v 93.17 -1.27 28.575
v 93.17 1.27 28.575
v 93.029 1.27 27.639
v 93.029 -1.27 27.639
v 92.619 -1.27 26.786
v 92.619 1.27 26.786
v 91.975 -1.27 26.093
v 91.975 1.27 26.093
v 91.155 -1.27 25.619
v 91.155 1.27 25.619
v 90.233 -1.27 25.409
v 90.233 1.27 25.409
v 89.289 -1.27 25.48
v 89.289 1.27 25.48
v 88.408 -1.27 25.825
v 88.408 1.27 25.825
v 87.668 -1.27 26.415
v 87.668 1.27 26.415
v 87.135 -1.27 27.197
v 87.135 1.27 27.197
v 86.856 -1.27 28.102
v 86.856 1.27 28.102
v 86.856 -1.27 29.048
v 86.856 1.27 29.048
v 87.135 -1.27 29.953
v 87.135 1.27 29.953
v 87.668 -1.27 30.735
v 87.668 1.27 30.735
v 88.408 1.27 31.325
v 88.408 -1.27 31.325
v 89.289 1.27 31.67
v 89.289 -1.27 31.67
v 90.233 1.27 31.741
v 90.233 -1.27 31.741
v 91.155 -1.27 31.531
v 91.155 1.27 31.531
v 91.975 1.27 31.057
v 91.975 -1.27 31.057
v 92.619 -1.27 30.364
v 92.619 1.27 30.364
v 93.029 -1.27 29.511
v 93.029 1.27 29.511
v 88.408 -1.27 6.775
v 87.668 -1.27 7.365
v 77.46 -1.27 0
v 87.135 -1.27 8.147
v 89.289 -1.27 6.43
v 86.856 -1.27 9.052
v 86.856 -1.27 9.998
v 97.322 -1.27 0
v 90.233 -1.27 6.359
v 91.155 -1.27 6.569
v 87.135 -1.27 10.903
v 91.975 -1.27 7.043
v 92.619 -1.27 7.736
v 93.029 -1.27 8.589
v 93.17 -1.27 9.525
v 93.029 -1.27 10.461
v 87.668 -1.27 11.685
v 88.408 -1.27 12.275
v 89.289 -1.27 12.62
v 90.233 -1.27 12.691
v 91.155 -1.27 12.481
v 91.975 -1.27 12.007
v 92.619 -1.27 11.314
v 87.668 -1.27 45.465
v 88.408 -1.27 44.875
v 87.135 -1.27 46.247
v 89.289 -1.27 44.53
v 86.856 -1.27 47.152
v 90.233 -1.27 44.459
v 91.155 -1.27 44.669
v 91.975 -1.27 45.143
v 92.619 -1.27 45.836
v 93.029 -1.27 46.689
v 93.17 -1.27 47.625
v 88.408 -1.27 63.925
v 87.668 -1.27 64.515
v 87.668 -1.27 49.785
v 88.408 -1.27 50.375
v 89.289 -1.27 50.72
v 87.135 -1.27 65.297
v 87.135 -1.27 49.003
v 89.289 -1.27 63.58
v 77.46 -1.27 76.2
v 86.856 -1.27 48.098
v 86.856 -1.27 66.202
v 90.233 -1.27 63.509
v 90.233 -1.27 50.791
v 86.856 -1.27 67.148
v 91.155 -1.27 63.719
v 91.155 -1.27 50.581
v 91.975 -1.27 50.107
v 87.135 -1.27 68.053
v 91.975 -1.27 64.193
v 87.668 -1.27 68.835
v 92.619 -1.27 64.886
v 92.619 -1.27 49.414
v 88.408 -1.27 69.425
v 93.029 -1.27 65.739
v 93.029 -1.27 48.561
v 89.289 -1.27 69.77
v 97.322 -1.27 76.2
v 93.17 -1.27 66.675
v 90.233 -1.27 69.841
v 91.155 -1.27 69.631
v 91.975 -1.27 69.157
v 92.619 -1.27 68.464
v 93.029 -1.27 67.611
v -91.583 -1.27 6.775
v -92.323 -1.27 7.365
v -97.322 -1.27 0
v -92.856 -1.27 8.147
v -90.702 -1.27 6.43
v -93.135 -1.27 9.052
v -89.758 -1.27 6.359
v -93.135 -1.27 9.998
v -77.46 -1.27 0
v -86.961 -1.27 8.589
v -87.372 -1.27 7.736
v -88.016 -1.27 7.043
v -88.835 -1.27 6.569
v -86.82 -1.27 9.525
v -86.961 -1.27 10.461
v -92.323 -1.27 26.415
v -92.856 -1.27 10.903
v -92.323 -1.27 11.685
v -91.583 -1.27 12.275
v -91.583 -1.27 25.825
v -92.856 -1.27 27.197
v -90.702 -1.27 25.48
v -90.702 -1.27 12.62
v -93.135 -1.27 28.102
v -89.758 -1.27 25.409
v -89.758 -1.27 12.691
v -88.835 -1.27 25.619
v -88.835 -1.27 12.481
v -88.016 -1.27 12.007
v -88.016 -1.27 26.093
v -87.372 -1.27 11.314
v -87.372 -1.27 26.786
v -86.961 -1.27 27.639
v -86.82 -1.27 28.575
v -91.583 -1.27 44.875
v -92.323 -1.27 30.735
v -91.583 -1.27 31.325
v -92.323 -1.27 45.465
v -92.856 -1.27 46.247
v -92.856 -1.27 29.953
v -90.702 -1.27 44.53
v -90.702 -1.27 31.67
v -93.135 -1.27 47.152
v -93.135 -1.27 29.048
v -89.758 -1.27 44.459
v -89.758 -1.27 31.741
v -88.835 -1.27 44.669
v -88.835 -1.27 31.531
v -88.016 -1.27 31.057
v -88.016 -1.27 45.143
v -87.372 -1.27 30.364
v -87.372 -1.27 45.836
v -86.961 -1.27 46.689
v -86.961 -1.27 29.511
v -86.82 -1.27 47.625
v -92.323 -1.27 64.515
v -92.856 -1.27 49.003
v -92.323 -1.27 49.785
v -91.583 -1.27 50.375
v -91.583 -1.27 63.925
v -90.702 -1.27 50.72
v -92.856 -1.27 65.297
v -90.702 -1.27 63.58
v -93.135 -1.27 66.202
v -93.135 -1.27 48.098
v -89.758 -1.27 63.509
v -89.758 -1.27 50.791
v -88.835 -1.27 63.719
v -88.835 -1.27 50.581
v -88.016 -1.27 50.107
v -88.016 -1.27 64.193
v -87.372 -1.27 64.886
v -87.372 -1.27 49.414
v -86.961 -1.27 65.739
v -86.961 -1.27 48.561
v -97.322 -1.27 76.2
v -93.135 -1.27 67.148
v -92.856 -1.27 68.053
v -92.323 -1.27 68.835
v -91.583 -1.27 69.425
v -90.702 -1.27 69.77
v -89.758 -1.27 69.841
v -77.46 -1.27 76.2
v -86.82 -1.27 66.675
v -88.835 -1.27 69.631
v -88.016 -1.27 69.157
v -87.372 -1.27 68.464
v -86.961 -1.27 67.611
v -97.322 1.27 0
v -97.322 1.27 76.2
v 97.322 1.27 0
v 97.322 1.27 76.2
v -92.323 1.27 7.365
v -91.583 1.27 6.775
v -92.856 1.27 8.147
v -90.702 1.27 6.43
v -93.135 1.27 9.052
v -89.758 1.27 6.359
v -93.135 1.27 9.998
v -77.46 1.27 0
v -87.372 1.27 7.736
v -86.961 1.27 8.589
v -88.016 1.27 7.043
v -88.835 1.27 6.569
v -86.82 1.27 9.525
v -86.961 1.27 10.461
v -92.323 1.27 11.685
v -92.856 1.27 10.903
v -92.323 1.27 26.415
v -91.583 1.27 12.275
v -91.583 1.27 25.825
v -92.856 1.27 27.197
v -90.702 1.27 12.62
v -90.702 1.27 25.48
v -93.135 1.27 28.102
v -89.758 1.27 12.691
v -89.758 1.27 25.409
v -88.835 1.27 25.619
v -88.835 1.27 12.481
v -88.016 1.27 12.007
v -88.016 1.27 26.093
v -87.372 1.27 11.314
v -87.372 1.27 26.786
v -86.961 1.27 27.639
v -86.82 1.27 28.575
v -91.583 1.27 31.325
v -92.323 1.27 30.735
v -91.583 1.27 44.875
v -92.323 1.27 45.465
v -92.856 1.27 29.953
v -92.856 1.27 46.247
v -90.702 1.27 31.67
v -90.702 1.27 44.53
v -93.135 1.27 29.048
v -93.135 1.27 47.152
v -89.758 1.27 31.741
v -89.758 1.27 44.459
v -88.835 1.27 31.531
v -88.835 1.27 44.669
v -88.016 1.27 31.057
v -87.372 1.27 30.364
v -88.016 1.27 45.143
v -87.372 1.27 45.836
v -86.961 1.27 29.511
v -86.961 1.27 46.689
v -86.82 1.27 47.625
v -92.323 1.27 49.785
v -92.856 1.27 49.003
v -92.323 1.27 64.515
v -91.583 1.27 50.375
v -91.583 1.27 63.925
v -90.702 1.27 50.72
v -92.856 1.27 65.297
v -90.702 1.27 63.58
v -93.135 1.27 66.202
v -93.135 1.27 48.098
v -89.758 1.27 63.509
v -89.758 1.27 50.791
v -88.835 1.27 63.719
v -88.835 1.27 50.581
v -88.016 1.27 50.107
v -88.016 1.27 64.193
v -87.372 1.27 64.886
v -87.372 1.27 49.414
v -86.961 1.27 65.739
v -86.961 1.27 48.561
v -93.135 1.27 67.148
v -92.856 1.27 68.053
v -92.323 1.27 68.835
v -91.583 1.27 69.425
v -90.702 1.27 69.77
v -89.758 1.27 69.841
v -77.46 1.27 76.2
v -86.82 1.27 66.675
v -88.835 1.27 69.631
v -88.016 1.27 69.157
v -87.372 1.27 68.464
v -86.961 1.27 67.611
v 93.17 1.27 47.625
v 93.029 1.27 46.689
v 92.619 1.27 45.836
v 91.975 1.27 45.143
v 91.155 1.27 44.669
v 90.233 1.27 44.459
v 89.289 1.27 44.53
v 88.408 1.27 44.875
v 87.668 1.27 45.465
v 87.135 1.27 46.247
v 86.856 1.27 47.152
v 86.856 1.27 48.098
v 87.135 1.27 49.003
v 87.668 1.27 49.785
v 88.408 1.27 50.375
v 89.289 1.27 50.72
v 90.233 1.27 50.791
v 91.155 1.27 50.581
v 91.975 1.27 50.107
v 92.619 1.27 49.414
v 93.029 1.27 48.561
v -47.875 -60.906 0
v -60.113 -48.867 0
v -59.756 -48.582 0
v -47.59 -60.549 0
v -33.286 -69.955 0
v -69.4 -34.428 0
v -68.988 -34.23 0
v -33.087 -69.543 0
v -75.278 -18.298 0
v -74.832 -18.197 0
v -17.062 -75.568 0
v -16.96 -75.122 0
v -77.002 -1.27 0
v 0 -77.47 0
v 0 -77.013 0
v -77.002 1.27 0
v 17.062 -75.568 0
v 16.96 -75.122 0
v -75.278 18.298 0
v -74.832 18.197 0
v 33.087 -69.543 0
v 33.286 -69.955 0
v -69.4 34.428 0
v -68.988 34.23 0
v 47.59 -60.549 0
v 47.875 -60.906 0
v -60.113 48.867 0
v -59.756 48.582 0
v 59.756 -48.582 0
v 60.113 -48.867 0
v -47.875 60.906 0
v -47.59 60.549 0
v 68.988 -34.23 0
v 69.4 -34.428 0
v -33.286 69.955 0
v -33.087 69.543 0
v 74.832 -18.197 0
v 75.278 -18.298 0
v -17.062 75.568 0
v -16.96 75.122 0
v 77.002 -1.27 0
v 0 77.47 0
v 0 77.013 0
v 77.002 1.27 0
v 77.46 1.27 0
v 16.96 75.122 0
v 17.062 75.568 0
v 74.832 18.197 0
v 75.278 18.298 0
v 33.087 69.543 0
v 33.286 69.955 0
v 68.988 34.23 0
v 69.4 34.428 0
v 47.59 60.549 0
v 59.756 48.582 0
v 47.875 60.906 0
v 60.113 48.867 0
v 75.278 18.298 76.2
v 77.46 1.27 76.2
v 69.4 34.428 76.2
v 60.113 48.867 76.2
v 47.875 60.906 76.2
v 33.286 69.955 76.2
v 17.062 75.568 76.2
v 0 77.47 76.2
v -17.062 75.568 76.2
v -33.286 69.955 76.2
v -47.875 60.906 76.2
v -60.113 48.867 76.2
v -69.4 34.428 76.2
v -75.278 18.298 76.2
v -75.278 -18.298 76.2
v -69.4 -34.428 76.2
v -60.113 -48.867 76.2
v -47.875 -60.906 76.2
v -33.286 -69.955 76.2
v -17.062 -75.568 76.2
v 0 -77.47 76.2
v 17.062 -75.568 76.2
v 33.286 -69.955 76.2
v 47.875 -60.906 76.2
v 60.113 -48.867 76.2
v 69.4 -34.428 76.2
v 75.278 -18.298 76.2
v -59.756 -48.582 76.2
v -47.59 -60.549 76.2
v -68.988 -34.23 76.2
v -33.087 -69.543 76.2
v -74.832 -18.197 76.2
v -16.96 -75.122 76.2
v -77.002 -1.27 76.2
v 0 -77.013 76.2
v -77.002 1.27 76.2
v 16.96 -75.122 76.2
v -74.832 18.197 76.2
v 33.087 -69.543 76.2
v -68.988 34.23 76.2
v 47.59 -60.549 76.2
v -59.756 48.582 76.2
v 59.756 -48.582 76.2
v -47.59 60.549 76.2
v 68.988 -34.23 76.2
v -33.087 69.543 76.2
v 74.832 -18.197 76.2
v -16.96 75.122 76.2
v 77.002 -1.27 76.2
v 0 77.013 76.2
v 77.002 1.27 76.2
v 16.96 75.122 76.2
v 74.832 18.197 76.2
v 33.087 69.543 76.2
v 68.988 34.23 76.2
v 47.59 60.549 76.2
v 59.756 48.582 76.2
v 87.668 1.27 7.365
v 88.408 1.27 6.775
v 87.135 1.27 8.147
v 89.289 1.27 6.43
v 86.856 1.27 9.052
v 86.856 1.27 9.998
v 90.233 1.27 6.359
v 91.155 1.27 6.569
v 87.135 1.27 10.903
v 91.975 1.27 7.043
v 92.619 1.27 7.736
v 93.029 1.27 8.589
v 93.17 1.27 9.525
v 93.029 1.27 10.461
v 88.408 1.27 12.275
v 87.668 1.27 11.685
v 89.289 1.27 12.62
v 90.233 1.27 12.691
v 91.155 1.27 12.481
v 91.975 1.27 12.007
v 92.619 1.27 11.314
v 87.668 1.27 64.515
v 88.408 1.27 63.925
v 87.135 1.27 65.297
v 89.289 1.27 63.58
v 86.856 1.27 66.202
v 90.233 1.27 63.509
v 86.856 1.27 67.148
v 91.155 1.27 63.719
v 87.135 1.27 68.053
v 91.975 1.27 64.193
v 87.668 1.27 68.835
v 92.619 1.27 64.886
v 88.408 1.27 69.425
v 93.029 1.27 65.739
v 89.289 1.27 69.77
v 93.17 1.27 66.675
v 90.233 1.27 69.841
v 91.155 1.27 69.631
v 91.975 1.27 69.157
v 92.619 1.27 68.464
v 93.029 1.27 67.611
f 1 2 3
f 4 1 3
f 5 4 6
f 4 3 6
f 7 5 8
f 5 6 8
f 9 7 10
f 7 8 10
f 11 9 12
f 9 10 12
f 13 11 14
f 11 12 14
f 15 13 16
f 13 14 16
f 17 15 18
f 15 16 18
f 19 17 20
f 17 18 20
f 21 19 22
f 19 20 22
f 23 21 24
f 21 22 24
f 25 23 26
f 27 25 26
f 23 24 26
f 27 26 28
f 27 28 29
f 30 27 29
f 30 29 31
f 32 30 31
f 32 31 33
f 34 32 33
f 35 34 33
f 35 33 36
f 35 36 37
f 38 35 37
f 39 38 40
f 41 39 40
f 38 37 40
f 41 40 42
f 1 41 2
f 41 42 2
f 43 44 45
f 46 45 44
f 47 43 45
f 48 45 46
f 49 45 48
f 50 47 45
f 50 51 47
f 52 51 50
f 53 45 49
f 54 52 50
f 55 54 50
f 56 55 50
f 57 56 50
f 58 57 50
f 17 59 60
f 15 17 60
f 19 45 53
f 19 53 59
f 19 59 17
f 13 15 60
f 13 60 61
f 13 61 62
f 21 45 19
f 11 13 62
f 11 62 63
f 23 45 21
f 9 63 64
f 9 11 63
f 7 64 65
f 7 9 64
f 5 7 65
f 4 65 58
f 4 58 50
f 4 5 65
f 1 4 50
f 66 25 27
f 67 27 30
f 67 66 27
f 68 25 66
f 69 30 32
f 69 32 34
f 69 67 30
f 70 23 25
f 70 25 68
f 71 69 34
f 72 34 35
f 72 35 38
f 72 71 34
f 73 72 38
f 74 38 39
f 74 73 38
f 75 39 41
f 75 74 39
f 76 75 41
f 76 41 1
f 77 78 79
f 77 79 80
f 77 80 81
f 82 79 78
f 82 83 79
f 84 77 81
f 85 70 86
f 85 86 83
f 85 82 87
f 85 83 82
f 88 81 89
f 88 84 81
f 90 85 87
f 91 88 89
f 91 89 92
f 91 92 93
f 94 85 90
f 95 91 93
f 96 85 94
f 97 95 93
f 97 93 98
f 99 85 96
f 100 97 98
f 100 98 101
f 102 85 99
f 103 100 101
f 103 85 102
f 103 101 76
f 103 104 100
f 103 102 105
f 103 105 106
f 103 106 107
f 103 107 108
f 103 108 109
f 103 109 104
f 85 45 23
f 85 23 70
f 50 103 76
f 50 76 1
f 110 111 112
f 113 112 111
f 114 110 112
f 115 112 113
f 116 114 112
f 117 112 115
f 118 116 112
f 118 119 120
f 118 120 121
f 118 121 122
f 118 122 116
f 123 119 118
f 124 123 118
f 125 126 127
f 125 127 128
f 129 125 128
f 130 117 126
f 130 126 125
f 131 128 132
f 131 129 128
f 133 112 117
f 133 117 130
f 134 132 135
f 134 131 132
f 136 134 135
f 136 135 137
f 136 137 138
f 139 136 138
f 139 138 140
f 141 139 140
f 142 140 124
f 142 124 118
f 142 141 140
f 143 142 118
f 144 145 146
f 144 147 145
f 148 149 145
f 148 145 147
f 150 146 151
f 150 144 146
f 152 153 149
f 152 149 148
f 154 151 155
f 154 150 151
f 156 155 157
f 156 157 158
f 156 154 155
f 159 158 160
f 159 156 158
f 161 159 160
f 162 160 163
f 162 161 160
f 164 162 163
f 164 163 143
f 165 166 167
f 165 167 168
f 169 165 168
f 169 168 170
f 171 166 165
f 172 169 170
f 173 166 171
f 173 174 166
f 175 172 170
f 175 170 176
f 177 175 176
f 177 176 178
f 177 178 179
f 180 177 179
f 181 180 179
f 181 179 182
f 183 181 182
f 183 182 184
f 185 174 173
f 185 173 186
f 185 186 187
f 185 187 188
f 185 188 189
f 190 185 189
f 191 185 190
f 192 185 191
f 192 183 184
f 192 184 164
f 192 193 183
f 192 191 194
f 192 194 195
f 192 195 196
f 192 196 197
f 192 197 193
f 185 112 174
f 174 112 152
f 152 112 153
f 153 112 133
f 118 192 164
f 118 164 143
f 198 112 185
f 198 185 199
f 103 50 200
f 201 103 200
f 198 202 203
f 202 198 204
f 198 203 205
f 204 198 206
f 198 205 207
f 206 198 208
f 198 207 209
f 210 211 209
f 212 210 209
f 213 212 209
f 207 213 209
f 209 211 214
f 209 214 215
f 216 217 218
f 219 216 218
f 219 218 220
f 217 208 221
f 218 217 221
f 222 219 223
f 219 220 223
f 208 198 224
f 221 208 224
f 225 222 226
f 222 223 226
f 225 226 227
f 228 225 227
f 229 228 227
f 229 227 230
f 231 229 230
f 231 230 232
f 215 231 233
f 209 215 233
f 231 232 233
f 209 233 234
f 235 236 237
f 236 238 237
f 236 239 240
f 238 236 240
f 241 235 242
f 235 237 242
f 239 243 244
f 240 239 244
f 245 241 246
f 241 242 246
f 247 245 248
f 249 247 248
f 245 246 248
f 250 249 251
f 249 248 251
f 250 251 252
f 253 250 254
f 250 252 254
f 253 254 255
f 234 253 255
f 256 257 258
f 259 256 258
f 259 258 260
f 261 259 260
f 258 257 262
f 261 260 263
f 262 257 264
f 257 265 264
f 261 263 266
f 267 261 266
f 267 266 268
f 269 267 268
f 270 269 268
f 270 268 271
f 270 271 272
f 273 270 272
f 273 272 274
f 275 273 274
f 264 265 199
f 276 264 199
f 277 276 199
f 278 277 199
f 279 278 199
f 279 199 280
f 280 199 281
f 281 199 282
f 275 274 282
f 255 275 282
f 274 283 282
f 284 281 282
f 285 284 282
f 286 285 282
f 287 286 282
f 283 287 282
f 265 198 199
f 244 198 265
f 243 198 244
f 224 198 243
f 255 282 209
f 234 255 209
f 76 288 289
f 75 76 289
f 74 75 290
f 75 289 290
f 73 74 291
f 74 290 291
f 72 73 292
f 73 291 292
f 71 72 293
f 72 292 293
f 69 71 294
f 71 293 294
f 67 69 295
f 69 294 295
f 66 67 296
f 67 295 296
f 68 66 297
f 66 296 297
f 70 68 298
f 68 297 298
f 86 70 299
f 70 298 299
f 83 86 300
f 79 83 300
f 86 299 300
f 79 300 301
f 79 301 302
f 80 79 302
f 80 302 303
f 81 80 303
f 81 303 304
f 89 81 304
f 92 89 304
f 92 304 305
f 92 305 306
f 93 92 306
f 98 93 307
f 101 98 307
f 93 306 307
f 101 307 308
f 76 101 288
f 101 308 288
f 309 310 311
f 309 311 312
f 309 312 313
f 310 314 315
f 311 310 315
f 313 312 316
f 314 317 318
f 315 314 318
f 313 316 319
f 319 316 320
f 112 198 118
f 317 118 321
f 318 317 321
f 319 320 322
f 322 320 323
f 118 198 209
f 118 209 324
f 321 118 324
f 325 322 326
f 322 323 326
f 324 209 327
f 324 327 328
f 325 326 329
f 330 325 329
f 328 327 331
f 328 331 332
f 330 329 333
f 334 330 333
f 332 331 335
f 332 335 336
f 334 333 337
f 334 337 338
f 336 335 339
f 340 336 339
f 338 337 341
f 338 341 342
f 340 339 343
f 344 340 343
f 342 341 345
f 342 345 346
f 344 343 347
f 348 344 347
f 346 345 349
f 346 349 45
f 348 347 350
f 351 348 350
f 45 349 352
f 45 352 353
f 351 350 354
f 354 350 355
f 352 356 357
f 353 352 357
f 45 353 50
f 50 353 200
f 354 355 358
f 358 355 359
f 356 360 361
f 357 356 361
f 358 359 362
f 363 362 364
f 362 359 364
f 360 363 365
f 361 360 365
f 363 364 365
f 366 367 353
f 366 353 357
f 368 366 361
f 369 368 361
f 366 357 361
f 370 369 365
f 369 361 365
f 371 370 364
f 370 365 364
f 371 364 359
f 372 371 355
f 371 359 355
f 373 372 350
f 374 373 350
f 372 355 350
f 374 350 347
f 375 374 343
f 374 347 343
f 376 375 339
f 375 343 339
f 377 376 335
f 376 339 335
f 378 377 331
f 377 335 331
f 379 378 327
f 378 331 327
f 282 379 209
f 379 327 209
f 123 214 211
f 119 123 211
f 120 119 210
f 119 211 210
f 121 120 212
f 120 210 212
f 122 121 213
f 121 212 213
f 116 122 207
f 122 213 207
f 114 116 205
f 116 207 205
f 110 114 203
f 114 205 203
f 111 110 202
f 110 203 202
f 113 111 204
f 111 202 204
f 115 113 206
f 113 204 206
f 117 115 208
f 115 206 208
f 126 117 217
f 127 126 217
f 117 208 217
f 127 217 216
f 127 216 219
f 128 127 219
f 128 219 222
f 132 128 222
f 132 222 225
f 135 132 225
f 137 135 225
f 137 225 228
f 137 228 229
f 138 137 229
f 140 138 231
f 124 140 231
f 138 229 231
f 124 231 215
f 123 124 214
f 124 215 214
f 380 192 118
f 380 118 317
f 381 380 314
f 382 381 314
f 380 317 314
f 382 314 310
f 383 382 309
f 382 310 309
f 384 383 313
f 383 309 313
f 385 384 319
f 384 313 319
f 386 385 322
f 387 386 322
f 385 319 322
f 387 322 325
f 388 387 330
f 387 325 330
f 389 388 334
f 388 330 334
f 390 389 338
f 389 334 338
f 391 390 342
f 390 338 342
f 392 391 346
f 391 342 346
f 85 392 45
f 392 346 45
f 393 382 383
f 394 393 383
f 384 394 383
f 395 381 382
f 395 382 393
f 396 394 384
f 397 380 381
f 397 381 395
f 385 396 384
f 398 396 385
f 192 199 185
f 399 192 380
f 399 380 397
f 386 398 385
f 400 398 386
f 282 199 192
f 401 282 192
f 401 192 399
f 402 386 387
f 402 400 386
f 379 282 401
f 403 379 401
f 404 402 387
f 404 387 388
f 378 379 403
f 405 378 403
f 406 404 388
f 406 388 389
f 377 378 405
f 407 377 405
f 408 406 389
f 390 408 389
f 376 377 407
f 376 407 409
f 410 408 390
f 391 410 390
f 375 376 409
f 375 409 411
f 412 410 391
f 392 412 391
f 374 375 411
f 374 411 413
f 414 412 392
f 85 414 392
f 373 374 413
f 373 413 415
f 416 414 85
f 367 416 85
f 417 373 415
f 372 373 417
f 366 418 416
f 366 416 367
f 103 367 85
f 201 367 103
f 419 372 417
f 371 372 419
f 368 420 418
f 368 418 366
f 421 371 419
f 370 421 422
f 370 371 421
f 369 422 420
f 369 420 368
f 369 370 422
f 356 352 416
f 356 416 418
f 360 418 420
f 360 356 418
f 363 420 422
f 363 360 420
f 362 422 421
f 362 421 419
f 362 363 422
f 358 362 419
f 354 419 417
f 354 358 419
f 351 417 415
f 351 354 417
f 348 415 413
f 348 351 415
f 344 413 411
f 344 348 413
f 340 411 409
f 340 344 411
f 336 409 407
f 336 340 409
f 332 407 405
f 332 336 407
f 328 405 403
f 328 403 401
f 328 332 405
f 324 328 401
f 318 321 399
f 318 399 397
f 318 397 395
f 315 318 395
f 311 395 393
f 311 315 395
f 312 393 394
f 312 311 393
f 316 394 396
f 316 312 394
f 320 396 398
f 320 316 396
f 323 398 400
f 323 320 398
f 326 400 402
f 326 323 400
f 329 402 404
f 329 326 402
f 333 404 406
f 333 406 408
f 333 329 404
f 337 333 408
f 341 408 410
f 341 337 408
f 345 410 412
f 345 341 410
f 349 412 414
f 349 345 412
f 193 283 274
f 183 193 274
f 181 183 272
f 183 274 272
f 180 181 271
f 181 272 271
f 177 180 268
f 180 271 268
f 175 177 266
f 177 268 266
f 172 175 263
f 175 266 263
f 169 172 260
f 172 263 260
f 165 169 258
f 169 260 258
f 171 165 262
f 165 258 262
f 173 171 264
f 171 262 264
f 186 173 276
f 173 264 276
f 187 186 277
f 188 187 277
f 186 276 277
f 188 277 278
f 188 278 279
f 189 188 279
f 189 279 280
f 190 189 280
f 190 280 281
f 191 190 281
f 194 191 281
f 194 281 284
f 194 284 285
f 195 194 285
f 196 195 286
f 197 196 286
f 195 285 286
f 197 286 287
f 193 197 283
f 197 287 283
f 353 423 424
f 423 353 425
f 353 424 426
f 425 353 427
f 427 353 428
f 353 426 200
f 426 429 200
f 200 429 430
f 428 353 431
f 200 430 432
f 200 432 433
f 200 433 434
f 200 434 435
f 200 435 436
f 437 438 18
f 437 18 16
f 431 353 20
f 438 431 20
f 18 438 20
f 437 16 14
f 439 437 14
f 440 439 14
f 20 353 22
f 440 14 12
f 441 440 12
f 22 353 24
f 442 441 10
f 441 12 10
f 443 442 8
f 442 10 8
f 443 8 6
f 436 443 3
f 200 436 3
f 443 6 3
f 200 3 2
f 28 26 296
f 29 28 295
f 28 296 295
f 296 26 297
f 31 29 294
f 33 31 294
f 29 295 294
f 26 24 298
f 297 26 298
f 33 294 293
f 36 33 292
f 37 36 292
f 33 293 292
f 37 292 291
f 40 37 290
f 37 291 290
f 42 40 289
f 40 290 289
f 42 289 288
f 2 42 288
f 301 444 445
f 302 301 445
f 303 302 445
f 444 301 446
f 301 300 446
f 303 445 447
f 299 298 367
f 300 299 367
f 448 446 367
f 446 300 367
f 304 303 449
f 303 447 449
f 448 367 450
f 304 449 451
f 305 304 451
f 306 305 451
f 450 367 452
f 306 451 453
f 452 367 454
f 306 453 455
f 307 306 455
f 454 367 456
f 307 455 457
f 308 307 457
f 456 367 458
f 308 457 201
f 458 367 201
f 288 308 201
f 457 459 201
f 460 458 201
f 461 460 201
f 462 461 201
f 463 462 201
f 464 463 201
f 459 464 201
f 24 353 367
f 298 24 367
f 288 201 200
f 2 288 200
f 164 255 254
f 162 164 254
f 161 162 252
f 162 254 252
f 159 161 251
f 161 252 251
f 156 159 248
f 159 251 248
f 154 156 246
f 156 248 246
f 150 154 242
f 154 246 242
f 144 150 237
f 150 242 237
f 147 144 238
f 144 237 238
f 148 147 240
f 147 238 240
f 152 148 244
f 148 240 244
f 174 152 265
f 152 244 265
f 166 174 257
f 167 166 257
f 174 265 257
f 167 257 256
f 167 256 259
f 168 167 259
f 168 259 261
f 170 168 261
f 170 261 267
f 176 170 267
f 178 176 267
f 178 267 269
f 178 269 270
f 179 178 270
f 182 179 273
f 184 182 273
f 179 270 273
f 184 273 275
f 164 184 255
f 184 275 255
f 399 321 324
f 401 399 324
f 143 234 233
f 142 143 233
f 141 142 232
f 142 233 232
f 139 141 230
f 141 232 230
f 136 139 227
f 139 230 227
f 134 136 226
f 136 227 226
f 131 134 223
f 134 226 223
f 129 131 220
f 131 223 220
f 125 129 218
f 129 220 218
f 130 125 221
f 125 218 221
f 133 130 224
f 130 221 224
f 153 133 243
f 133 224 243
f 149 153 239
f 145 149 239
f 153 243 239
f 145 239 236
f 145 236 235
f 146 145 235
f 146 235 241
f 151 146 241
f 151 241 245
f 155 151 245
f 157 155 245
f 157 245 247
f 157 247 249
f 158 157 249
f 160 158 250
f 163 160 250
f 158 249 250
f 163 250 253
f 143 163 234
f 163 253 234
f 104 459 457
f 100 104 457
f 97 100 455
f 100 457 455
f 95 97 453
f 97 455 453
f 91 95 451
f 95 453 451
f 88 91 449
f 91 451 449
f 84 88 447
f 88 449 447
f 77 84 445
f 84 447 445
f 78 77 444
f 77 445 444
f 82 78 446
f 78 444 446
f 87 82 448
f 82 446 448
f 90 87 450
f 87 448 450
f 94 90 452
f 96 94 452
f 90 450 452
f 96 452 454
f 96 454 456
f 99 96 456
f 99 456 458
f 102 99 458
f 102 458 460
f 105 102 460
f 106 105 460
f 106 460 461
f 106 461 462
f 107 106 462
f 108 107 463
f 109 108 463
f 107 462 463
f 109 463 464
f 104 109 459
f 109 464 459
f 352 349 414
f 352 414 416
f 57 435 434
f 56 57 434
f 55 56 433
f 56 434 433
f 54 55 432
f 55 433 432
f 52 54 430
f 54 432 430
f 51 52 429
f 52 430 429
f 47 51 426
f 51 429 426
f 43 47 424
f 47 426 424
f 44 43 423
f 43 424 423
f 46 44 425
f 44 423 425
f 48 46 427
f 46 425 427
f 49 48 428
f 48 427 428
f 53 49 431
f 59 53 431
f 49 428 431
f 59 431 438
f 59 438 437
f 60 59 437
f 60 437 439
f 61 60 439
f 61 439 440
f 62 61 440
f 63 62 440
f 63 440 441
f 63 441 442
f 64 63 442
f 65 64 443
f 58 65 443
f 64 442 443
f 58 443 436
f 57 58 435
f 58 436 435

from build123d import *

# Parameters (mm, degrees)
SKETCH1_R           = 77.47
SKETCH1_R_2         = 77.0128
BOSS_EXTRUDE1_DEPTH = 76.2
SKETCH2_W           = 20.32
SKETCH2_H           = 2.54
BOSS_EXTRUDE2_DEPTH = 76.2
SKETCH3_R           = 3.175
CUT_EXTRUDE3_DEPTH  = 2.54


with BuildPart() as part:
    # Sketch1 → Boss-Extrude1 (new body)
    with BuildSketch(Plane.XY):
        Circle(SKETCH1_R)
        Circle(SKETCH1_R_2, mode=Mode.SUBTRACT)
    extrude(amount=BOSS_EXTRUDE1_DEPTH)

    # Sketch2 → Boss-Extrude2 (add)
    with BuildSketch(Plane.XY.offset(76.2)):
        with Locations((87.162327652, 0)):
            Rectangle(SKETCH2_W, SKETCH2_H)
        with Locations((-87.162327652, 0)):
            Rectangle(SKETCH2_W, SKETCH2_H)
    extrude(amount=-BOSS_EXTRUDE2_DEPTH)

    # Sketch3 → Cut-Extrude3 (cut)
    with BuildSketch(Plane(origin=(0, 1.27, 0), x_dir=(1, 0, 0), z_dir=(0, 1, 0))):
        with Locations((89.995251464, -9.525)):
            Circle(SKETCH3_R)
        with Locations((89.995251464, -28.575)):
            Circle(SKETCH3_R)
        with Locations((89.995251464, -47.625)):
            Circle(SKETCH3_R)
        with Locations((89.995251464, -66.675)):
            Circle(SKETCH3_R)
        with Locations((-89.995251464, -9.525)):
            Circle(SKETCH3_R)
        with Locations((-89.995251464, -28.575)):
            Circle(SKETCH3_R)
        with Locations((-89.995251464, -47.625)):
            Circle(SKETCH3_R)
        with Locations((-89.995251464, -66.675)):
            Circle(SKETCH3_R)
    extrude(amount=-CUT_EXTRUDE3_DEPTH, mode=Mode.SUBTRACT)


solid = part.part
